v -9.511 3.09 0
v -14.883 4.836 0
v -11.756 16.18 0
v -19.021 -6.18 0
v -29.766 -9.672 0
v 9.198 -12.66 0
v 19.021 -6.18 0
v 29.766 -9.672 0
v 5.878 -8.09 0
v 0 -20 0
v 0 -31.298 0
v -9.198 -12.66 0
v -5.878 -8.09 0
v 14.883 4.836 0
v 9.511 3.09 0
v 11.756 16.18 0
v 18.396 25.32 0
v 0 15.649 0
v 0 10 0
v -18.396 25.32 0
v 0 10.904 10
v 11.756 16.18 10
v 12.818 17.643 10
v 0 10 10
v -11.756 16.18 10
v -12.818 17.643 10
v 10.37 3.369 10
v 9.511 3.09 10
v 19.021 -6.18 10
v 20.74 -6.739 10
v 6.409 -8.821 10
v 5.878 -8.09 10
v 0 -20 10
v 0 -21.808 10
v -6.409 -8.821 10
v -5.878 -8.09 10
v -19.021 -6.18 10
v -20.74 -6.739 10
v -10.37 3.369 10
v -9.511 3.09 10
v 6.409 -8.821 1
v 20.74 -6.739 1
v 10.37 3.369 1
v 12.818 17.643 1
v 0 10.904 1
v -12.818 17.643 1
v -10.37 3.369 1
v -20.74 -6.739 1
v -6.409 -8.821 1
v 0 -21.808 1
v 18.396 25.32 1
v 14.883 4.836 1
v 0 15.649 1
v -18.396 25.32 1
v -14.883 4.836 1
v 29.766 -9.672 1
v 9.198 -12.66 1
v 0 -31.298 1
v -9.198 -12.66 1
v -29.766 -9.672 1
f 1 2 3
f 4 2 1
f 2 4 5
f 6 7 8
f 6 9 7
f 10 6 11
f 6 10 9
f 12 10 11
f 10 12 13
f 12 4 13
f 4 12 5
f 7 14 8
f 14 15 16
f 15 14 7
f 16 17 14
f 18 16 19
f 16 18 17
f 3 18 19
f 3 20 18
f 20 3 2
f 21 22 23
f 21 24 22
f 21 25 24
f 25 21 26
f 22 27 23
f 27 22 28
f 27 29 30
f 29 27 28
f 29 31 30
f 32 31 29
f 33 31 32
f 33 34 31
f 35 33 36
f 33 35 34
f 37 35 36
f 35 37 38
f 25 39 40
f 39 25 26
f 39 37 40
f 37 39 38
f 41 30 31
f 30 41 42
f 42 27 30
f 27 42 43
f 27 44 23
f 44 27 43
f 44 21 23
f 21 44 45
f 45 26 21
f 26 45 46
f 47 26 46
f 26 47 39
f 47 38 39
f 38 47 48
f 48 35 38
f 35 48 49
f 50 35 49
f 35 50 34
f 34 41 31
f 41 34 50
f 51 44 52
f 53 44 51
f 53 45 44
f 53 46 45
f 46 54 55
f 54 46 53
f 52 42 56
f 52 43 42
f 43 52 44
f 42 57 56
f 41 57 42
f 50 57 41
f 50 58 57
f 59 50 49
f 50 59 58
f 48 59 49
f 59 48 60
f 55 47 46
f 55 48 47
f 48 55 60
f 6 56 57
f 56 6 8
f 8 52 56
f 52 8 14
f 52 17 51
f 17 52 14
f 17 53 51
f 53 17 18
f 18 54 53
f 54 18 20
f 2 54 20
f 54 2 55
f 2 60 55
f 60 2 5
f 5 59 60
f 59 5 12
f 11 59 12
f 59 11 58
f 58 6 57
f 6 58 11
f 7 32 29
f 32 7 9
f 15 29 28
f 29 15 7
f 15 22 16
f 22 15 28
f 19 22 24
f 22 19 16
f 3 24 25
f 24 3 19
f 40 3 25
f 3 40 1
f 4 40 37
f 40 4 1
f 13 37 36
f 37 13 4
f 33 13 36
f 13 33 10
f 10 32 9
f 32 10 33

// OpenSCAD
shape = 1; //[1: star, 2: polygon, 3: circle, 4: rectangle]

// For stars, polygons and circle
radius = 20;

// For stars and polygons, 3 sided star does not work.
sides = 5;

// For stars only
inner_radius = 10;

// For rectangle
width = 20;

// For rectangle
height = 20;

/*[Adjust]*/
// Thickness of the cutting edge
thickness = 0.8;
// Width of the padding at the bottom
pad_width = 5;
// Height of the padding at the bottom
pad_height = 1;
// Height of the overall cutter
depth = 10;

/* [Hidden] */

if(shape == 1) {
    templatify(star(radius, inner_radius, sides));
}
else if(shape == 2) {
    templatify(ngon(radius, sides));
}
else if(shape == 3) {
    templatify(ngon(radius, radius * 6));
}
else if(shape == 4) {
    templatify([[0,0],[width,0],[width,height],[0,height]]);
}

function star(r_out, r_in, sides) = 
    let(a = 360 / (sides*2))
    [for(i = [0:(sides*2-1)]) 
        let(r = i%2 ? r_out : r_in)
        [cos(a*i+a/2) * r, sin(a*i+a/2) * r]];
    
function ngon(r, sides) = star(r, r, sides / 2);
    
function circ(r) = star(r, r, 48);

function get(points, i, cp) = 
    (i<0) ? points[cp+i%cp] : points[i%cp];
    
function dist(p) = sqrt(p[0]*p[0] + p[1]*p[1]);
function slope(p1, p2) = (p2[1]-p1[1])/(p2[0]-p1[0]);
function getderiv(p1, p2) = let(diff = p2-p1) diff / dist(diff);
function getperp(p1, p2) = 
    let(deriv = getderiv(p1, p2))
    [deriv[1], -deriv[0]];
    
function offset(p, c, n, off) = 
    let(
        pp = getperp(p, c), 
        pcp = c + pp * off,
        ppp = p + pp * off,
        np = getperp(c, n), 
        ncp = c + np * off,
        nnp = n + np * off,
        
        x1 = ppp[0], y1 = ppp[1],
        x2 = pcp[0], y2 = pcp[1],
        x3 = ncp[0], y3 = ncp[1],
        x4 = nnp[0], y4 = nnp[1],
        
        d = (x1-x2) * (y3-y4) - (y1-y2) * (x3-x4),
        a = (x1*y2 - y1*x2),
        b = (x3*y4 - y3*x4)
    )

    [
        (a * (x3-x4) - (x1-x2) * b) / d,
        (a * (y3-y4) - (y1-y2) * b) / d
        
    ];
     

module templatify(
    points, 
    depth = depth, 
    thickness = thickness,
    pad_width = pad_width,
    pad_height = pad_height,
    convexity = 4
) {
  cp = len(points);
    
  prev = [for(i=[0:cp-1]) get(points, i-1, cp)];
  next = [for(i=[0:cp-1]) get(points, i+1, cp)];
  cur = points;
  
  bord = [for(i=[0:cp-1])
       offset(prev[i], cur[i], next[i], thickness)
  ];
    
  pad = [for(i=[0:cp-1])
       offset(prev[i], cur[i], next[i], pad_width)
  ];
      
  
  difference() {
    union() {
        linear_extrude(height = depth, convexity=convexity)
        polygon(bord, convexity=convexity);

        linear_extrude(height = pad_height, convexity=convexity)
        polygon(pad, convexity=convexity);
    }

    translate([0, 0, -0.1])
    linear_extrude(height = depth+0.2, convexity=convexity)
    polygon(points, convexity=convexity);
  }
}
